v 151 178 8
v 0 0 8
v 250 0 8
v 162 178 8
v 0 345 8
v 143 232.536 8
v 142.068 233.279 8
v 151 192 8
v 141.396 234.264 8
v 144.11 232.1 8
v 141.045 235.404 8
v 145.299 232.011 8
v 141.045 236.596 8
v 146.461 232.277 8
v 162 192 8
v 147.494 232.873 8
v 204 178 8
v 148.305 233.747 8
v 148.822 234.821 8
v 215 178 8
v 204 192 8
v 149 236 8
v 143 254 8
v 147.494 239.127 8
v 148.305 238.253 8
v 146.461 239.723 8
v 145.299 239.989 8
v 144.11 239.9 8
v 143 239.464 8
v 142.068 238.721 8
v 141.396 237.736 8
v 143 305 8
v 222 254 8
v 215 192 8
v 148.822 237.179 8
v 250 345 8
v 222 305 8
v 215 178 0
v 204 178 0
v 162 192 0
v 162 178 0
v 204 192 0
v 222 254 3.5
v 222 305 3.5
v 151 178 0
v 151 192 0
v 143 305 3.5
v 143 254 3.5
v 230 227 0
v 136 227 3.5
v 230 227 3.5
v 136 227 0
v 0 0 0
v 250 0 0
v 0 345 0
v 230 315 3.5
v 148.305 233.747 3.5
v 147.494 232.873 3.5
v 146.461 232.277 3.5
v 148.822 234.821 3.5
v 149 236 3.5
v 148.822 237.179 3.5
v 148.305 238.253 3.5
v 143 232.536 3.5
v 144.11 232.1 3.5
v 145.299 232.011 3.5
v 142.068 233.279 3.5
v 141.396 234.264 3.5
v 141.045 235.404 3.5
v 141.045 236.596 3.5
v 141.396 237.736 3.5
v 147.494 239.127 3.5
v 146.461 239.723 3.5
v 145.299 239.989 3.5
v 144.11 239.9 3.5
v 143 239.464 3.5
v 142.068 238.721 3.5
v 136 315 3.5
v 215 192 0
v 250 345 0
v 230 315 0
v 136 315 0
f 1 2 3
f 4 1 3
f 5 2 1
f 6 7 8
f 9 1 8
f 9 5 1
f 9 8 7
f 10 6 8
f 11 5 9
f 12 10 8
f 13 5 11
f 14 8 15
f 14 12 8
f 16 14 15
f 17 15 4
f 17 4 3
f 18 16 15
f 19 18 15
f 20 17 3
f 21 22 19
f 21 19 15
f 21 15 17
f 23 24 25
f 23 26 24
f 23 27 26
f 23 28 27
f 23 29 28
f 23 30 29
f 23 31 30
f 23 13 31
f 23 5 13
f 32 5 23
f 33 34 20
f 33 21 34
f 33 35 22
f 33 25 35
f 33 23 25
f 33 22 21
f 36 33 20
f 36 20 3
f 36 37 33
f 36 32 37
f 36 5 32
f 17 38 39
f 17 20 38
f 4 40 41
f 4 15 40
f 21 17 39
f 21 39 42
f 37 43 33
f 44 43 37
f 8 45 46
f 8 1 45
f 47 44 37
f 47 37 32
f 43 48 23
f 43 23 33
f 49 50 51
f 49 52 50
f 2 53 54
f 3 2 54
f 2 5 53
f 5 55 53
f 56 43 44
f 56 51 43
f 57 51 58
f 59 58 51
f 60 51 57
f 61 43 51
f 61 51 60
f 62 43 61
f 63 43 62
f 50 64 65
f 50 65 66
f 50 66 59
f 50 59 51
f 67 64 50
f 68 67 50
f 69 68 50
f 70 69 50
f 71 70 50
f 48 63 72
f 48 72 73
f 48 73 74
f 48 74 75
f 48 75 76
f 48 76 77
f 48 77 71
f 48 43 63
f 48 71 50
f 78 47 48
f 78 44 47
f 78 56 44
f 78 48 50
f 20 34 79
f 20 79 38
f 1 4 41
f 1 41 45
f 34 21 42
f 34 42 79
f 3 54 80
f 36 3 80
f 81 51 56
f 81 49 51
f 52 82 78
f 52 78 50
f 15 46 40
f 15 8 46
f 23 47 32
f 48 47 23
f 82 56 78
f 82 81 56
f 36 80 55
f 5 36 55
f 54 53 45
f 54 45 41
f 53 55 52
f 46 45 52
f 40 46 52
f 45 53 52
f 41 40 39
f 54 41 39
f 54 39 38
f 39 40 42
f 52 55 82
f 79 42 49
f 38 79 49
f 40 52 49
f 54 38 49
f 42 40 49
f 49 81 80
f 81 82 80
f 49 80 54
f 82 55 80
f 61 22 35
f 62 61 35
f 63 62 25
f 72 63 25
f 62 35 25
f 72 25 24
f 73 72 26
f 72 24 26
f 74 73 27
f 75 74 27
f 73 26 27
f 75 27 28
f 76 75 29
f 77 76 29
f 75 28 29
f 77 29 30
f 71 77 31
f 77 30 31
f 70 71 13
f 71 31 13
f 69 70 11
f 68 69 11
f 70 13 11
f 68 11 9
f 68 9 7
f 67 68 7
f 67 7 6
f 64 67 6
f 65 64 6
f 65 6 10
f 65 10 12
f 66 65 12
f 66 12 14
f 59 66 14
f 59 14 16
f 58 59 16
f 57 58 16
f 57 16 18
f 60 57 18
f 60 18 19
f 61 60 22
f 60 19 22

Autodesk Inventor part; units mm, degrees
ref_plane "YZ Plane" through (0, 0, 0) normal (1, 0, 0) x (0, 1, 0)
ref_plane "XZ Plane" through (0, 0, 0) normal (0, 1, 0) x (-1, 0, 0)
ref_plane "XY Plane" through (0, 0, 0) normal (0, 0, 1) x (1, 0, 0)
sketch "Sketch1" plane through (0, 0, 0) normal (0, 0, 1) x (1, 0, 0)
  line L0 (0, 0) -> (250, 0)
  line L1 (250, 0) -> (250, 345)
  line L2 (250, 345) -> (0, 345)
  line L3 (0, 345) -> (0, 0)
  dimension "d0" = 250
  dimension "d1" = 345
extrude "Extrusion1" add sketch "Sketch1" along normal blind 8
sketch "Sketch2" plane through (0, 0, 8) normal (0, 0, 1) x (1, 0, 0)
  line L0 (136, 315) -> (230, 315)
  line L1 (230, 315) -> (230, 227)
  line L2 (230, 227) -> (136, 227)
  line L3 (136, 227) -> (136, 315)
  line L4 (250, 0) -> (250, 345) projected
  line L5 (250, 345) -> (0, 345) projected
  line L6 (151, 192) -> (162, 192)
  line L7 (162, 192) -> (162, 178)
  line L8 (162, 178) -> (151, 178)
  line L9 (151, 178) -> (151, 192)
  line L10 (204, 192) -> (215, 192)
  line L11 (215, 192) -> (215, 178)
  line L12 (215, 178) -> (204, 178)
  line L13 (204, 178) -> (204, 192)
  circle A0 centre (145, 236) radius 4
  point P0 (0, 0)
  dimension "d4" = 94
  dimension "d5" = 88
  dimension "d6" = 20
  dimension "d7" = 30
  dimension "d8" = 9
  dimension "d9" = 9
  dimension "d10" = 8
  dimension "d11" = 11
  dimension "d12" = 14
  dimension "d13" = 11
  dimension "d14" = 14
  dimension "d15" = 15
  dimension "d16" = 15
  dimension "d17" = 35
extrude "Extrusion2" cut sketch "Sketch2" against normal through all contours L6 L7 L8 L9 | L10 L11 L12 L13 | A0
sketch "Sketch3" plane through (0, 0, 0) normal (0, 0, -1) x (-1, 0, 0)
  line L0 (-230, 315) -> (-136, 315)
  line L1 (-136, 315) -> (-136, 227)
  line L2 (-136, 227) -> (-230, 227)
  line L3 (-230, 227) -> (-230, 315)
  line L4 (-250, 345) -> (0, 345) projected
  line L5 (-250, 0) -> (-250, 345) projected
  point P0 (0, 0)
  dimension "d20" = 94
  dimension "d21" = 30
  dimension "d22" = 88
  dimension "d23" = 20
extrude "Extrusion3" cut sketch "Sketch3" against normal blind 3.5
sketch "Sketch4" plane through (0, 0, 3.5) normal (0, 0, -1) x (-1, 0, 0)
  line L0 (-222, 305) -> (-143, 305)
  line L1 (-143, 305) -> (-143, 254)
  line L2 (-143, 254) -> (-222, 254)
  line L3 (-222, 254) -> (-222, 305)
  line L4 (-230, 227) -> (-230, 315) projected
  line L5 (-136, 315) -> (-136, 227) projected
  line L6 (-230, 315) -> (-136, 315) projected
  line L7 (-136, 227) -> (-230, 227) projected
  point P0 (0, 0)
  dimension "d26" = 8
  dimension "d27" = 7
  dimension "d28" = 10
  dimension "d29" = 27
extrude "Extrusion4" cut sketch "Sketch4" against normal through all contours L0 L1 L2 L3
equation "\"d13\" = d11"
equation "\"d14\" = d12"
properties part number "capac frontal"
